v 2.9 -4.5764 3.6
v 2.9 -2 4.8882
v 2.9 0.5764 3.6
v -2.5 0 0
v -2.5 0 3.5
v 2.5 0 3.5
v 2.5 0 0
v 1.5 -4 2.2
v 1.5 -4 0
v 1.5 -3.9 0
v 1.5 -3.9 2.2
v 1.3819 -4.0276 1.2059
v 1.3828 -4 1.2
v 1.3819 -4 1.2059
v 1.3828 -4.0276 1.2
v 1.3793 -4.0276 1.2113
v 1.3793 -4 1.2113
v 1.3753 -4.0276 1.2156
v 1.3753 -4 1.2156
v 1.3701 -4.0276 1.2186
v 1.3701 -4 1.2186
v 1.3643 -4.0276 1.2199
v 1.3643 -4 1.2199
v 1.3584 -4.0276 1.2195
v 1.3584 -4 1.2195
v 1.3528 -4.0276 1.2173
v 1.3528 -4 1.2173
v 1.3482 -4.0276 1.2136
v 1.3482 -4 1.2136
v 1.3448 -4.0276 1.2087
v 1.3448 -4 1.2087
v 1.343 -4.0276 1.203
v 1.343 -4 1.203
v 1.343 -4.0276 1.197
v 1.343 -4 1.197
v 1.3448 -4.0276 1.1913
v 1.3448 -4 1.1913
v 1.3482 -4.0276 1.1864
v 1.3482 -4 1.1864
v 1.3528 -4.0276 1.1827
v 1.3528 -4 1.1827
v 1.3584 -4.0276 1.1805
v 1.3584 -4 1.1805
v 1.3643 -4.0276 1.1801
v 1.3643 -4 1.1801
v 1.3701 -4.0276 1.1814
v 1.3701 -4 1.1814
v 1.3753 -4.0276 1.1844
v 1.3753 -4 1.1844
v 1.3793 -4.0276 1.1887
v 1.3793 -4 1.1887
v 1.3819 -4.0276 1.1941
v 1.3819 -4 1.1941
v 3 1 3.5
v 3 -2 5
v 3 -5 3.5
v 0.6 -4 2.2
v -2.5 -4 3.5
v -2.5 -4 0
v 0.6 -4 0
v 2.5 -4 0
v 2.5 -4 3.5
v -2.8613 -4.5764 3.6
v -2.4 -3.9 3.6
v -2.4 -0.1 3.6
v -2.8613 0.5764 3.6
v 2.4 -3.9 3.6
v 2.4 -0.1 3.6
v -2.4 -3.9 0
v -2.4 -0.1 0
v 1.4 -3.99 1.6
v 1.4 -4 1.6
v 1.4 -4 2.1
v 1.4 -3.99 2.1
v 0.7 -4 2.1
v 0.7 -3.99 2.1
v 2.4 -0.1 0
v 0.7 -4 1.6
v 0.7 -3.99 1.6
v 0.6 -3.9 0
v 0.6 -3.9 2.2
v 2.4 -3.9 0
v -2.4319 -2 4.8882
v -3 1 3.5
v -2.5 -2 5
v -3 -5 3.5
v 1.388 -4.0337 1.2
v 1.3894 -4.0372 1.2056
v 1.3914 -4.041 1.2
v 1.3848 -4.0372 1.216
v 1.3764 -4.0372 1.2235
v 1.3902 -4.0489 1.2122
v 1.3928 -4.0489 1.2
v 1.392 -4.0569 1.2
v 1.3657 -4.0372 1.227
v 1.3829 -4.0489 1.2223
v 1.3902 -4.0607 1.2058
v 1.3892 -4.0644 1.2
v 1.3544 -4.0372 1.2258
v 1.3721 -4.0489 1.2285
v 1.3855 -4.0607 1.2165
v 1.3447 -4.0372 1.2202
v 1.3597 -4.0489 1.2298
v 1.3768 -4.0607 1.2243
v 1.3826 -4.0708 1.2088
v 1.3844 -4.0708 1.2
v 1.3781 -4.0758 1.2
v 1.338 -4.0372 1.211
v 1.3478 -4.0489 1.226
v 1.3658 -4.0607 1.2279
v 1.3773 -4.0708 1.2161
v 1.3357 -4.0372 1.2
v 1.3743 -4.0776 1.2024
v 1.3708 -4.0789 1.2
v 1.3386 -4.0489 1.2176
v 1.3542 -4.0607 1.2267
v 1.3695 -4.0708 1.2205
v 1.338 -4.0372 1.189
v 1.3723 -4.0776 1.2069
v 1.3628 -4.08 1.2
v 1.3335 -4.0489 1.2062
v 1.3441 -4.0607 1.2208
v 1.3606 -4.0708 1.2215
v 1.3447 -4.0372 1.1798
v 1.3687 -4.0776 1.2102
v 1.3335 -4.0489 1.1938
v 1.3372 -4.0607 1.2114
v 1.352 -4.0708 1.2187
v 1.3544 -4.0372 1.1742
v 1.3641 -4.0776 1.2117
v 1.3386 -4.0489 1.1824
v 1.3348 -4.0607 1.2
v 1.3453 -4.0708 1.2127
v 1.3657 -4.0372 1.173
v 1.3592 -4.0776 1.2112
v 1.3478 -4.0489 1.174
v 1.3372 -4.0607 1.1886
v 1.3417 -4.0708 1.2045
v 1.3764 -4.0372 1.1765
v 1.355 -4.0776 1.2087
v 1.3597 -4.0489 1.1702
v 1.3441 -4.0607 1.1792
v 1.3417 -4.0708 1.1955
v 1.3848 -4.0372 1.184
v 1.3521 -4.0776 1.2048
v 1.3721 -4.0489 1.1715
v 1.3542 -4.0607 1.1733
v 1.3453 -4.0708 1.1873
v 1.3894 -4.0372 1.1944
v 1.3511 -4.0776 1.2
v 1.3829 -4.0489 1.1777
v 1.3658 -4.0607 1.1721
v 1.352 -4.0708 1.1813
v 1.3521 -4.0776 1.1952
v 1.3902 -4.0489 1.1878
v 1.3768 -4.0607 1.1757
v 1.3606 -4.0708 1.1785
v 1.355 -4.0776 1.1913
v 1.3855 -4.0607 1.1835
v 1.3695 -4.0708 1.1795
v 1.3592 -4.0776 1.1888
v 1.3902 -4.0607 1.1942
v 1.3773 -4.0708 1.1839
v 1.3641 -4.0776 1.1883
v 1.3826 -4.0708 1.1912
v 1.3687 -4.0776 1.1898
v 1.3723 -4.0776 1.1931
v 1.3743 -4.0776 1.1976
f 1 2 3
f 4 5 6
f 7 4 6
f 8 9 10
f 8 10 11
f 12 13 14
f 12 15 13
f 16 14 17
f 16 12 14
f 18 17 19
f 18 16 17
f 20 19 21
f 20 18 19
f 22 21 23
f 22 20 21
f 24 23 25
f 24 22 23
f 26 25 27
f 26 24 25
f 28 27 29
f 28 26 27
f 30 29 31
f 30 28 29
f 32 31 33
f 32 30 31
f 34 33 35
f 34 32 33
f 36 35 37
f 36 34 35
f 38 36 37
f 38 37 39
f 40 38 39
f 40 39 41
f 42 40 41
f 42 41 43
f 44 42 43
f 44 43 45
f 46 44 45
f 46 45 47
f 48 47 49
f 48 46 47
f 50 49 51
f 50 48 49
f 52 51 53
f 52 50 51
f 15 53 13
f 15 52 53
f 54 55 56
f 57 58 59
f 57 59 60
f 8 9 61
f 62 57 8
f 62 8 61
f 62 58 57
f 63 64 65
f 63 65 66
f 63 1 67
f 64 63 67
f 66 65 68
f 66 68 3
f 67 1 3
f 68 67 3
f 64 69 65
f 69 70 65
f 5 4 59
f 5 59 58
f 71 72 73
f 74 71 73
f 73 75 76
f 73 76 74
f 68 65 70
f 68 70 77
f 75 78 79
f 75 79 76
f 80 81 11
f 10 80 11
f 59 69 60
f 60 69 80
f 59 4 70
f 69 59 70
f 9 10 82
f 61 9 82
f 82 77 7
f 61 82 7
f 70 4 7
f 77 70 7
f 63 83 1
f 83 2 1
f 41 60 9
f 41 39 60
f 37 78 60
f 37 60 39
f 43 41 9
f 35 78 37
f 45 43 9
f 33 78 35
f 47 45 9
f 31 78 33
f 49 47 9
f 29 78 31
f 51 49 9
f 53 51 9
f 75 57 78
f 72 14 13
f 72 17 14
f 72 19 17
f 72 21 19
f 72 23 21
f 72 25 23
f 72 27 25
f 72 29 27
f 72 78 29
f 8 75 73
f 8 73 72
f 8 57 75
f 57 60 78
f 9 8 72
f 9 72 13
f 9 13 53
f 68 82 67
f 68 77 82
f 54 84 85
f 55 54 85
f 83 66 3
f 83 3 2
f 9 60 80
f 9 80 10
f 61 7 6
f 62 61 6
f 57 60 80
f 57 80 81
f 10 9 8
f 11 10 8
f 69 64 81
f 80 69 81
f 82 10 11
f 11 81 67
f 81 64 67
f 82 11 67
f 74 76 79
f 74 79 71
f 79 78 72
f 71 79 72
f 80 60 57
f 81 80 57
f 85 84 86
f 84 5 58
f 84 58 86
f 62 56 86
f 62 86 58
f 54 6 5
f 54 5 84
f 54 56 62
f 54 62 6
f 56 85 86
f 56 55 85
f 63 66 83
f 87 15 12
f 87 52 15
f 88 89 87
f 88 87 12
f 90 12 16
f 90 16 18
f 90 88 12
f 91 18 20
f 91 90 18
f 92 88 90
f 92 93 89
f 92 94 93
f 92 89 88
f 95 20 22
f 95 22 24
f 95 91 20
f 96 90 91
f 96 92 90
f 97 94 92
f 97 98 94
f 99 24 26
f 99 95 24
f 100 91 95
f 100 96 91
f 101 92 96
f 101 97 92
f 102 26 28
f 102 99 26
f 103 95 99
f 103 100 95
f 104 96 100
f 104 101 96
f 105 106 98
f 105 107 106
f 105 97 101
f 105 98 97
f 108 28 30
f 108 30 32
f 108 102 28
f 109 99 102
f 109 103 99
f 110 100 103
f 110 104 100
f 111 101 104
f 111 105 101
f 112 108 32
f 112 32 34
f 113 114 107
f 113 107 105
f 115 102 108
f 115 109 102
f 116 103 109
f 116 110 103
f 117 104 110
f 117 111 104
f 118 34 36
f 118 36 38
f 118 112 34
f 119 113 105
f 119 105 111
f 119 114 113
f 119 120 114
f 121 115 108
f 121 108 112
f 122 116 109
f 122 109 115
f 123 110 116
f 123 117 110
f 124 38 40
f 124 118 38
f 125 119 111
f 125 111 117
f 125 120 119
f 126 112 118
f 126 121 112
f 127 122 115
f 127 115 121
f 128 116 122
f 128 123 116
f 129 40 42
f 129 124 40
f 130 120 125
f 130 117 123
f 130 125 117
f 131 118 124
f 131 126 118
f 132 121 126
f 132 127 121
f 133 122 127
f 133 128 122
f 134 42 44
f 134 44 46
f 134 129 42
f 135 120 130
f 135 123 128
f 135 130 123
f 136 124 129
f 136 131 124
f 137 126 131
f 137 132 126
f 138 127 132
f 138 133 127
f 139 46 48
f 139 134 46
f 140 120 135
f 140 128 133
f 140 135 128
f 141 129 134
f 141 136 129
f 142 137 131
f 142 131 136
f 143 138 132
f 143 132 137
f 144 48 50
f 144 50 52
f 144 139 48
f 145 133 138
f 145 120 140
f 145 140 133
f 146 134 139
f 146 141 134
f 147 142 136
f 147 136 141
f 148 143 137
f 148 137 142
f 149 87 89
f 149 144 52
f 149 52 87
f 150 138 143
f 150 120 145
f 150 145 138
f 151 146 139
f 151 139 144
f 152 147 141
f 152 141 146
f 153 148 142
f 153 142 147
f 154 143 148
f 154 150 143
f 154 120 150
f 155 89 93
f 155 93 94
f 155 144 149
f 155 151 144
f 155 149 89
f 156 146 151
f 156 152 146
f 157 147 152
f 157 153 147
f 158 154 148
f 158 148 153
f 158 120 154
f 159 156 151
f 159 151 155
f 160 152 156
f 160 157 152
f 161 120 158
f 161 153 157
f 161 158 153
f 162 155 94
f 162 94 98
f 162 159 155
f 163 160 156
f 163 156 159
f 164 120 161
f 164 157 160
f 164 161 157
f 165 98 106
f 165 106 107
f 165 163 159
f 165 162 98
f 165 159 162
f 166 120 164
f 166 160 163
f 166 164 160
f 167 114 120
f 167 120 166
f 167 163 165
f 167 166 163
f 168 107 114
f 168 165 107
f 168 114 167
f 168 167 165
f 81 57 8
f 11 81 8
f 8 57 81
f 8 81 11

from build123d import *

# Parameters (mm, degrees)
F0_W          = 5
F0_H          = 3.5
F1_DEPTH      = 4
F4_DEPTH      = 0.5
F4_DEPTH_BACK = 5.5
F6_DEPTH      = 25
F6_DEPTH_BACK = 25
F7_T          = -0.1
F2_W          = 0.9
F2_H          = 2.2
F8_DEPTH      = 0.1
F9_W          = 0.9
F9_H          = 2.2
F10_DEPTH     = 0.1
F11_W         = 0.7
F11_H         = 0.5
F12_DEPTH     = 0.01


with BuildPart() as f1:
    # F0 (on Front) → F1 (new body)
    with BuildSketch(Plane.XZ):
        with Locations((0, 1.75)):
            Rectangle(F0_W, F0_H)
    extrude(amount=F1_DEPTH)

    # F3 (on face) → F4 (join, two sides)
    with BuildSketch(Plane.YZ.offset(2.5)) as f4_sk:
        Polygon((-2, 5), (-5, 3.5), (-4, 3.5), (0, 3.5), (1, 3.5), align=None)
    extrude(amount=F4_DEPTH)
    extrude(f4_sk.sketch, amount=-F4_DEPTH_BACK)

    # F5 (on face) → F6 (cut, two sides)
    with BuildSketch(Plane.XZ.offset(4)) as f6_sk:
        Polygon((-3, 5), (-3, 3.5), (-2.5, 5), align=None)
    extrude(amount=-F6_DEPTH, mode=Mode.SUBTRACT)
    extrude(f6_sk.sketch, amount=F6_DEPTH_BACK, mode=Mode.SUBTRACT)

    # F7
    f7_openings = [f1.faces().sort_by_distance(p)[0] for p in [
        (0, -2, 0),
    ]]
    offset(amount=F7_T, openings=f7_openings, kind=Kind.INTERSECTION)

    # F2 (on face) → F8 (cut, through all)
    with BuildSketch(Plane.XZ.offset(4)):
        with Locations((1.05, 1.1)):
            Rectangle(F2_W, F2_H)
    extrude(amount=-F8_DEPTH, mode=Mode.SUBTRACT)


with BuildPart() as f10:
    # F9 (on face) → F10 (new body)
    with BuildSketch(Plane.XZ.offset(4)):
        with Locations((1.05, 1.1)):
            Rectangle(F9_W, F9_H)
    extrude(amount=-F10_DEPTH)

    # F11 (on face) → F12 (cut)
    with BuildSketch(Plane.XZ.offset(4)):
        with Locations((1.05, 1.85)):
            Rectangle(F11_W, F11_H)
    extrude(amount=-F12_DEPTH, mode=Mode.SUBTRACT)

    # F14 (on offset) → F15 (revolve)
    with BuildSketch(Plane(origin=(0, 0, 1.2), x_dir=(1, 0, 0), z_dir=(0, 0, -1))):
        with BuildLine():
            Line((1.3828235336, 4), (1.3828235336, 4.0276393202))
            ThreePointArc((1.3828235336, 4.0276393202), (1.3908487044, 4.0607046627), (1.3628235336, 4.08))
            Line((1.3628235336, 4.08), (1.3628235336, 4.02))
            Line((1.3628235336, 4.02), (1.3628235336, 4))
            Line((1.3628235336, 4), (1.3828235336, 4))
        make_face()
    revolve(axis=Axis((1.3628235336, -4.05, 1.2), (0, -1, 0)))


solid = Compound([f1.part, f10.part])
